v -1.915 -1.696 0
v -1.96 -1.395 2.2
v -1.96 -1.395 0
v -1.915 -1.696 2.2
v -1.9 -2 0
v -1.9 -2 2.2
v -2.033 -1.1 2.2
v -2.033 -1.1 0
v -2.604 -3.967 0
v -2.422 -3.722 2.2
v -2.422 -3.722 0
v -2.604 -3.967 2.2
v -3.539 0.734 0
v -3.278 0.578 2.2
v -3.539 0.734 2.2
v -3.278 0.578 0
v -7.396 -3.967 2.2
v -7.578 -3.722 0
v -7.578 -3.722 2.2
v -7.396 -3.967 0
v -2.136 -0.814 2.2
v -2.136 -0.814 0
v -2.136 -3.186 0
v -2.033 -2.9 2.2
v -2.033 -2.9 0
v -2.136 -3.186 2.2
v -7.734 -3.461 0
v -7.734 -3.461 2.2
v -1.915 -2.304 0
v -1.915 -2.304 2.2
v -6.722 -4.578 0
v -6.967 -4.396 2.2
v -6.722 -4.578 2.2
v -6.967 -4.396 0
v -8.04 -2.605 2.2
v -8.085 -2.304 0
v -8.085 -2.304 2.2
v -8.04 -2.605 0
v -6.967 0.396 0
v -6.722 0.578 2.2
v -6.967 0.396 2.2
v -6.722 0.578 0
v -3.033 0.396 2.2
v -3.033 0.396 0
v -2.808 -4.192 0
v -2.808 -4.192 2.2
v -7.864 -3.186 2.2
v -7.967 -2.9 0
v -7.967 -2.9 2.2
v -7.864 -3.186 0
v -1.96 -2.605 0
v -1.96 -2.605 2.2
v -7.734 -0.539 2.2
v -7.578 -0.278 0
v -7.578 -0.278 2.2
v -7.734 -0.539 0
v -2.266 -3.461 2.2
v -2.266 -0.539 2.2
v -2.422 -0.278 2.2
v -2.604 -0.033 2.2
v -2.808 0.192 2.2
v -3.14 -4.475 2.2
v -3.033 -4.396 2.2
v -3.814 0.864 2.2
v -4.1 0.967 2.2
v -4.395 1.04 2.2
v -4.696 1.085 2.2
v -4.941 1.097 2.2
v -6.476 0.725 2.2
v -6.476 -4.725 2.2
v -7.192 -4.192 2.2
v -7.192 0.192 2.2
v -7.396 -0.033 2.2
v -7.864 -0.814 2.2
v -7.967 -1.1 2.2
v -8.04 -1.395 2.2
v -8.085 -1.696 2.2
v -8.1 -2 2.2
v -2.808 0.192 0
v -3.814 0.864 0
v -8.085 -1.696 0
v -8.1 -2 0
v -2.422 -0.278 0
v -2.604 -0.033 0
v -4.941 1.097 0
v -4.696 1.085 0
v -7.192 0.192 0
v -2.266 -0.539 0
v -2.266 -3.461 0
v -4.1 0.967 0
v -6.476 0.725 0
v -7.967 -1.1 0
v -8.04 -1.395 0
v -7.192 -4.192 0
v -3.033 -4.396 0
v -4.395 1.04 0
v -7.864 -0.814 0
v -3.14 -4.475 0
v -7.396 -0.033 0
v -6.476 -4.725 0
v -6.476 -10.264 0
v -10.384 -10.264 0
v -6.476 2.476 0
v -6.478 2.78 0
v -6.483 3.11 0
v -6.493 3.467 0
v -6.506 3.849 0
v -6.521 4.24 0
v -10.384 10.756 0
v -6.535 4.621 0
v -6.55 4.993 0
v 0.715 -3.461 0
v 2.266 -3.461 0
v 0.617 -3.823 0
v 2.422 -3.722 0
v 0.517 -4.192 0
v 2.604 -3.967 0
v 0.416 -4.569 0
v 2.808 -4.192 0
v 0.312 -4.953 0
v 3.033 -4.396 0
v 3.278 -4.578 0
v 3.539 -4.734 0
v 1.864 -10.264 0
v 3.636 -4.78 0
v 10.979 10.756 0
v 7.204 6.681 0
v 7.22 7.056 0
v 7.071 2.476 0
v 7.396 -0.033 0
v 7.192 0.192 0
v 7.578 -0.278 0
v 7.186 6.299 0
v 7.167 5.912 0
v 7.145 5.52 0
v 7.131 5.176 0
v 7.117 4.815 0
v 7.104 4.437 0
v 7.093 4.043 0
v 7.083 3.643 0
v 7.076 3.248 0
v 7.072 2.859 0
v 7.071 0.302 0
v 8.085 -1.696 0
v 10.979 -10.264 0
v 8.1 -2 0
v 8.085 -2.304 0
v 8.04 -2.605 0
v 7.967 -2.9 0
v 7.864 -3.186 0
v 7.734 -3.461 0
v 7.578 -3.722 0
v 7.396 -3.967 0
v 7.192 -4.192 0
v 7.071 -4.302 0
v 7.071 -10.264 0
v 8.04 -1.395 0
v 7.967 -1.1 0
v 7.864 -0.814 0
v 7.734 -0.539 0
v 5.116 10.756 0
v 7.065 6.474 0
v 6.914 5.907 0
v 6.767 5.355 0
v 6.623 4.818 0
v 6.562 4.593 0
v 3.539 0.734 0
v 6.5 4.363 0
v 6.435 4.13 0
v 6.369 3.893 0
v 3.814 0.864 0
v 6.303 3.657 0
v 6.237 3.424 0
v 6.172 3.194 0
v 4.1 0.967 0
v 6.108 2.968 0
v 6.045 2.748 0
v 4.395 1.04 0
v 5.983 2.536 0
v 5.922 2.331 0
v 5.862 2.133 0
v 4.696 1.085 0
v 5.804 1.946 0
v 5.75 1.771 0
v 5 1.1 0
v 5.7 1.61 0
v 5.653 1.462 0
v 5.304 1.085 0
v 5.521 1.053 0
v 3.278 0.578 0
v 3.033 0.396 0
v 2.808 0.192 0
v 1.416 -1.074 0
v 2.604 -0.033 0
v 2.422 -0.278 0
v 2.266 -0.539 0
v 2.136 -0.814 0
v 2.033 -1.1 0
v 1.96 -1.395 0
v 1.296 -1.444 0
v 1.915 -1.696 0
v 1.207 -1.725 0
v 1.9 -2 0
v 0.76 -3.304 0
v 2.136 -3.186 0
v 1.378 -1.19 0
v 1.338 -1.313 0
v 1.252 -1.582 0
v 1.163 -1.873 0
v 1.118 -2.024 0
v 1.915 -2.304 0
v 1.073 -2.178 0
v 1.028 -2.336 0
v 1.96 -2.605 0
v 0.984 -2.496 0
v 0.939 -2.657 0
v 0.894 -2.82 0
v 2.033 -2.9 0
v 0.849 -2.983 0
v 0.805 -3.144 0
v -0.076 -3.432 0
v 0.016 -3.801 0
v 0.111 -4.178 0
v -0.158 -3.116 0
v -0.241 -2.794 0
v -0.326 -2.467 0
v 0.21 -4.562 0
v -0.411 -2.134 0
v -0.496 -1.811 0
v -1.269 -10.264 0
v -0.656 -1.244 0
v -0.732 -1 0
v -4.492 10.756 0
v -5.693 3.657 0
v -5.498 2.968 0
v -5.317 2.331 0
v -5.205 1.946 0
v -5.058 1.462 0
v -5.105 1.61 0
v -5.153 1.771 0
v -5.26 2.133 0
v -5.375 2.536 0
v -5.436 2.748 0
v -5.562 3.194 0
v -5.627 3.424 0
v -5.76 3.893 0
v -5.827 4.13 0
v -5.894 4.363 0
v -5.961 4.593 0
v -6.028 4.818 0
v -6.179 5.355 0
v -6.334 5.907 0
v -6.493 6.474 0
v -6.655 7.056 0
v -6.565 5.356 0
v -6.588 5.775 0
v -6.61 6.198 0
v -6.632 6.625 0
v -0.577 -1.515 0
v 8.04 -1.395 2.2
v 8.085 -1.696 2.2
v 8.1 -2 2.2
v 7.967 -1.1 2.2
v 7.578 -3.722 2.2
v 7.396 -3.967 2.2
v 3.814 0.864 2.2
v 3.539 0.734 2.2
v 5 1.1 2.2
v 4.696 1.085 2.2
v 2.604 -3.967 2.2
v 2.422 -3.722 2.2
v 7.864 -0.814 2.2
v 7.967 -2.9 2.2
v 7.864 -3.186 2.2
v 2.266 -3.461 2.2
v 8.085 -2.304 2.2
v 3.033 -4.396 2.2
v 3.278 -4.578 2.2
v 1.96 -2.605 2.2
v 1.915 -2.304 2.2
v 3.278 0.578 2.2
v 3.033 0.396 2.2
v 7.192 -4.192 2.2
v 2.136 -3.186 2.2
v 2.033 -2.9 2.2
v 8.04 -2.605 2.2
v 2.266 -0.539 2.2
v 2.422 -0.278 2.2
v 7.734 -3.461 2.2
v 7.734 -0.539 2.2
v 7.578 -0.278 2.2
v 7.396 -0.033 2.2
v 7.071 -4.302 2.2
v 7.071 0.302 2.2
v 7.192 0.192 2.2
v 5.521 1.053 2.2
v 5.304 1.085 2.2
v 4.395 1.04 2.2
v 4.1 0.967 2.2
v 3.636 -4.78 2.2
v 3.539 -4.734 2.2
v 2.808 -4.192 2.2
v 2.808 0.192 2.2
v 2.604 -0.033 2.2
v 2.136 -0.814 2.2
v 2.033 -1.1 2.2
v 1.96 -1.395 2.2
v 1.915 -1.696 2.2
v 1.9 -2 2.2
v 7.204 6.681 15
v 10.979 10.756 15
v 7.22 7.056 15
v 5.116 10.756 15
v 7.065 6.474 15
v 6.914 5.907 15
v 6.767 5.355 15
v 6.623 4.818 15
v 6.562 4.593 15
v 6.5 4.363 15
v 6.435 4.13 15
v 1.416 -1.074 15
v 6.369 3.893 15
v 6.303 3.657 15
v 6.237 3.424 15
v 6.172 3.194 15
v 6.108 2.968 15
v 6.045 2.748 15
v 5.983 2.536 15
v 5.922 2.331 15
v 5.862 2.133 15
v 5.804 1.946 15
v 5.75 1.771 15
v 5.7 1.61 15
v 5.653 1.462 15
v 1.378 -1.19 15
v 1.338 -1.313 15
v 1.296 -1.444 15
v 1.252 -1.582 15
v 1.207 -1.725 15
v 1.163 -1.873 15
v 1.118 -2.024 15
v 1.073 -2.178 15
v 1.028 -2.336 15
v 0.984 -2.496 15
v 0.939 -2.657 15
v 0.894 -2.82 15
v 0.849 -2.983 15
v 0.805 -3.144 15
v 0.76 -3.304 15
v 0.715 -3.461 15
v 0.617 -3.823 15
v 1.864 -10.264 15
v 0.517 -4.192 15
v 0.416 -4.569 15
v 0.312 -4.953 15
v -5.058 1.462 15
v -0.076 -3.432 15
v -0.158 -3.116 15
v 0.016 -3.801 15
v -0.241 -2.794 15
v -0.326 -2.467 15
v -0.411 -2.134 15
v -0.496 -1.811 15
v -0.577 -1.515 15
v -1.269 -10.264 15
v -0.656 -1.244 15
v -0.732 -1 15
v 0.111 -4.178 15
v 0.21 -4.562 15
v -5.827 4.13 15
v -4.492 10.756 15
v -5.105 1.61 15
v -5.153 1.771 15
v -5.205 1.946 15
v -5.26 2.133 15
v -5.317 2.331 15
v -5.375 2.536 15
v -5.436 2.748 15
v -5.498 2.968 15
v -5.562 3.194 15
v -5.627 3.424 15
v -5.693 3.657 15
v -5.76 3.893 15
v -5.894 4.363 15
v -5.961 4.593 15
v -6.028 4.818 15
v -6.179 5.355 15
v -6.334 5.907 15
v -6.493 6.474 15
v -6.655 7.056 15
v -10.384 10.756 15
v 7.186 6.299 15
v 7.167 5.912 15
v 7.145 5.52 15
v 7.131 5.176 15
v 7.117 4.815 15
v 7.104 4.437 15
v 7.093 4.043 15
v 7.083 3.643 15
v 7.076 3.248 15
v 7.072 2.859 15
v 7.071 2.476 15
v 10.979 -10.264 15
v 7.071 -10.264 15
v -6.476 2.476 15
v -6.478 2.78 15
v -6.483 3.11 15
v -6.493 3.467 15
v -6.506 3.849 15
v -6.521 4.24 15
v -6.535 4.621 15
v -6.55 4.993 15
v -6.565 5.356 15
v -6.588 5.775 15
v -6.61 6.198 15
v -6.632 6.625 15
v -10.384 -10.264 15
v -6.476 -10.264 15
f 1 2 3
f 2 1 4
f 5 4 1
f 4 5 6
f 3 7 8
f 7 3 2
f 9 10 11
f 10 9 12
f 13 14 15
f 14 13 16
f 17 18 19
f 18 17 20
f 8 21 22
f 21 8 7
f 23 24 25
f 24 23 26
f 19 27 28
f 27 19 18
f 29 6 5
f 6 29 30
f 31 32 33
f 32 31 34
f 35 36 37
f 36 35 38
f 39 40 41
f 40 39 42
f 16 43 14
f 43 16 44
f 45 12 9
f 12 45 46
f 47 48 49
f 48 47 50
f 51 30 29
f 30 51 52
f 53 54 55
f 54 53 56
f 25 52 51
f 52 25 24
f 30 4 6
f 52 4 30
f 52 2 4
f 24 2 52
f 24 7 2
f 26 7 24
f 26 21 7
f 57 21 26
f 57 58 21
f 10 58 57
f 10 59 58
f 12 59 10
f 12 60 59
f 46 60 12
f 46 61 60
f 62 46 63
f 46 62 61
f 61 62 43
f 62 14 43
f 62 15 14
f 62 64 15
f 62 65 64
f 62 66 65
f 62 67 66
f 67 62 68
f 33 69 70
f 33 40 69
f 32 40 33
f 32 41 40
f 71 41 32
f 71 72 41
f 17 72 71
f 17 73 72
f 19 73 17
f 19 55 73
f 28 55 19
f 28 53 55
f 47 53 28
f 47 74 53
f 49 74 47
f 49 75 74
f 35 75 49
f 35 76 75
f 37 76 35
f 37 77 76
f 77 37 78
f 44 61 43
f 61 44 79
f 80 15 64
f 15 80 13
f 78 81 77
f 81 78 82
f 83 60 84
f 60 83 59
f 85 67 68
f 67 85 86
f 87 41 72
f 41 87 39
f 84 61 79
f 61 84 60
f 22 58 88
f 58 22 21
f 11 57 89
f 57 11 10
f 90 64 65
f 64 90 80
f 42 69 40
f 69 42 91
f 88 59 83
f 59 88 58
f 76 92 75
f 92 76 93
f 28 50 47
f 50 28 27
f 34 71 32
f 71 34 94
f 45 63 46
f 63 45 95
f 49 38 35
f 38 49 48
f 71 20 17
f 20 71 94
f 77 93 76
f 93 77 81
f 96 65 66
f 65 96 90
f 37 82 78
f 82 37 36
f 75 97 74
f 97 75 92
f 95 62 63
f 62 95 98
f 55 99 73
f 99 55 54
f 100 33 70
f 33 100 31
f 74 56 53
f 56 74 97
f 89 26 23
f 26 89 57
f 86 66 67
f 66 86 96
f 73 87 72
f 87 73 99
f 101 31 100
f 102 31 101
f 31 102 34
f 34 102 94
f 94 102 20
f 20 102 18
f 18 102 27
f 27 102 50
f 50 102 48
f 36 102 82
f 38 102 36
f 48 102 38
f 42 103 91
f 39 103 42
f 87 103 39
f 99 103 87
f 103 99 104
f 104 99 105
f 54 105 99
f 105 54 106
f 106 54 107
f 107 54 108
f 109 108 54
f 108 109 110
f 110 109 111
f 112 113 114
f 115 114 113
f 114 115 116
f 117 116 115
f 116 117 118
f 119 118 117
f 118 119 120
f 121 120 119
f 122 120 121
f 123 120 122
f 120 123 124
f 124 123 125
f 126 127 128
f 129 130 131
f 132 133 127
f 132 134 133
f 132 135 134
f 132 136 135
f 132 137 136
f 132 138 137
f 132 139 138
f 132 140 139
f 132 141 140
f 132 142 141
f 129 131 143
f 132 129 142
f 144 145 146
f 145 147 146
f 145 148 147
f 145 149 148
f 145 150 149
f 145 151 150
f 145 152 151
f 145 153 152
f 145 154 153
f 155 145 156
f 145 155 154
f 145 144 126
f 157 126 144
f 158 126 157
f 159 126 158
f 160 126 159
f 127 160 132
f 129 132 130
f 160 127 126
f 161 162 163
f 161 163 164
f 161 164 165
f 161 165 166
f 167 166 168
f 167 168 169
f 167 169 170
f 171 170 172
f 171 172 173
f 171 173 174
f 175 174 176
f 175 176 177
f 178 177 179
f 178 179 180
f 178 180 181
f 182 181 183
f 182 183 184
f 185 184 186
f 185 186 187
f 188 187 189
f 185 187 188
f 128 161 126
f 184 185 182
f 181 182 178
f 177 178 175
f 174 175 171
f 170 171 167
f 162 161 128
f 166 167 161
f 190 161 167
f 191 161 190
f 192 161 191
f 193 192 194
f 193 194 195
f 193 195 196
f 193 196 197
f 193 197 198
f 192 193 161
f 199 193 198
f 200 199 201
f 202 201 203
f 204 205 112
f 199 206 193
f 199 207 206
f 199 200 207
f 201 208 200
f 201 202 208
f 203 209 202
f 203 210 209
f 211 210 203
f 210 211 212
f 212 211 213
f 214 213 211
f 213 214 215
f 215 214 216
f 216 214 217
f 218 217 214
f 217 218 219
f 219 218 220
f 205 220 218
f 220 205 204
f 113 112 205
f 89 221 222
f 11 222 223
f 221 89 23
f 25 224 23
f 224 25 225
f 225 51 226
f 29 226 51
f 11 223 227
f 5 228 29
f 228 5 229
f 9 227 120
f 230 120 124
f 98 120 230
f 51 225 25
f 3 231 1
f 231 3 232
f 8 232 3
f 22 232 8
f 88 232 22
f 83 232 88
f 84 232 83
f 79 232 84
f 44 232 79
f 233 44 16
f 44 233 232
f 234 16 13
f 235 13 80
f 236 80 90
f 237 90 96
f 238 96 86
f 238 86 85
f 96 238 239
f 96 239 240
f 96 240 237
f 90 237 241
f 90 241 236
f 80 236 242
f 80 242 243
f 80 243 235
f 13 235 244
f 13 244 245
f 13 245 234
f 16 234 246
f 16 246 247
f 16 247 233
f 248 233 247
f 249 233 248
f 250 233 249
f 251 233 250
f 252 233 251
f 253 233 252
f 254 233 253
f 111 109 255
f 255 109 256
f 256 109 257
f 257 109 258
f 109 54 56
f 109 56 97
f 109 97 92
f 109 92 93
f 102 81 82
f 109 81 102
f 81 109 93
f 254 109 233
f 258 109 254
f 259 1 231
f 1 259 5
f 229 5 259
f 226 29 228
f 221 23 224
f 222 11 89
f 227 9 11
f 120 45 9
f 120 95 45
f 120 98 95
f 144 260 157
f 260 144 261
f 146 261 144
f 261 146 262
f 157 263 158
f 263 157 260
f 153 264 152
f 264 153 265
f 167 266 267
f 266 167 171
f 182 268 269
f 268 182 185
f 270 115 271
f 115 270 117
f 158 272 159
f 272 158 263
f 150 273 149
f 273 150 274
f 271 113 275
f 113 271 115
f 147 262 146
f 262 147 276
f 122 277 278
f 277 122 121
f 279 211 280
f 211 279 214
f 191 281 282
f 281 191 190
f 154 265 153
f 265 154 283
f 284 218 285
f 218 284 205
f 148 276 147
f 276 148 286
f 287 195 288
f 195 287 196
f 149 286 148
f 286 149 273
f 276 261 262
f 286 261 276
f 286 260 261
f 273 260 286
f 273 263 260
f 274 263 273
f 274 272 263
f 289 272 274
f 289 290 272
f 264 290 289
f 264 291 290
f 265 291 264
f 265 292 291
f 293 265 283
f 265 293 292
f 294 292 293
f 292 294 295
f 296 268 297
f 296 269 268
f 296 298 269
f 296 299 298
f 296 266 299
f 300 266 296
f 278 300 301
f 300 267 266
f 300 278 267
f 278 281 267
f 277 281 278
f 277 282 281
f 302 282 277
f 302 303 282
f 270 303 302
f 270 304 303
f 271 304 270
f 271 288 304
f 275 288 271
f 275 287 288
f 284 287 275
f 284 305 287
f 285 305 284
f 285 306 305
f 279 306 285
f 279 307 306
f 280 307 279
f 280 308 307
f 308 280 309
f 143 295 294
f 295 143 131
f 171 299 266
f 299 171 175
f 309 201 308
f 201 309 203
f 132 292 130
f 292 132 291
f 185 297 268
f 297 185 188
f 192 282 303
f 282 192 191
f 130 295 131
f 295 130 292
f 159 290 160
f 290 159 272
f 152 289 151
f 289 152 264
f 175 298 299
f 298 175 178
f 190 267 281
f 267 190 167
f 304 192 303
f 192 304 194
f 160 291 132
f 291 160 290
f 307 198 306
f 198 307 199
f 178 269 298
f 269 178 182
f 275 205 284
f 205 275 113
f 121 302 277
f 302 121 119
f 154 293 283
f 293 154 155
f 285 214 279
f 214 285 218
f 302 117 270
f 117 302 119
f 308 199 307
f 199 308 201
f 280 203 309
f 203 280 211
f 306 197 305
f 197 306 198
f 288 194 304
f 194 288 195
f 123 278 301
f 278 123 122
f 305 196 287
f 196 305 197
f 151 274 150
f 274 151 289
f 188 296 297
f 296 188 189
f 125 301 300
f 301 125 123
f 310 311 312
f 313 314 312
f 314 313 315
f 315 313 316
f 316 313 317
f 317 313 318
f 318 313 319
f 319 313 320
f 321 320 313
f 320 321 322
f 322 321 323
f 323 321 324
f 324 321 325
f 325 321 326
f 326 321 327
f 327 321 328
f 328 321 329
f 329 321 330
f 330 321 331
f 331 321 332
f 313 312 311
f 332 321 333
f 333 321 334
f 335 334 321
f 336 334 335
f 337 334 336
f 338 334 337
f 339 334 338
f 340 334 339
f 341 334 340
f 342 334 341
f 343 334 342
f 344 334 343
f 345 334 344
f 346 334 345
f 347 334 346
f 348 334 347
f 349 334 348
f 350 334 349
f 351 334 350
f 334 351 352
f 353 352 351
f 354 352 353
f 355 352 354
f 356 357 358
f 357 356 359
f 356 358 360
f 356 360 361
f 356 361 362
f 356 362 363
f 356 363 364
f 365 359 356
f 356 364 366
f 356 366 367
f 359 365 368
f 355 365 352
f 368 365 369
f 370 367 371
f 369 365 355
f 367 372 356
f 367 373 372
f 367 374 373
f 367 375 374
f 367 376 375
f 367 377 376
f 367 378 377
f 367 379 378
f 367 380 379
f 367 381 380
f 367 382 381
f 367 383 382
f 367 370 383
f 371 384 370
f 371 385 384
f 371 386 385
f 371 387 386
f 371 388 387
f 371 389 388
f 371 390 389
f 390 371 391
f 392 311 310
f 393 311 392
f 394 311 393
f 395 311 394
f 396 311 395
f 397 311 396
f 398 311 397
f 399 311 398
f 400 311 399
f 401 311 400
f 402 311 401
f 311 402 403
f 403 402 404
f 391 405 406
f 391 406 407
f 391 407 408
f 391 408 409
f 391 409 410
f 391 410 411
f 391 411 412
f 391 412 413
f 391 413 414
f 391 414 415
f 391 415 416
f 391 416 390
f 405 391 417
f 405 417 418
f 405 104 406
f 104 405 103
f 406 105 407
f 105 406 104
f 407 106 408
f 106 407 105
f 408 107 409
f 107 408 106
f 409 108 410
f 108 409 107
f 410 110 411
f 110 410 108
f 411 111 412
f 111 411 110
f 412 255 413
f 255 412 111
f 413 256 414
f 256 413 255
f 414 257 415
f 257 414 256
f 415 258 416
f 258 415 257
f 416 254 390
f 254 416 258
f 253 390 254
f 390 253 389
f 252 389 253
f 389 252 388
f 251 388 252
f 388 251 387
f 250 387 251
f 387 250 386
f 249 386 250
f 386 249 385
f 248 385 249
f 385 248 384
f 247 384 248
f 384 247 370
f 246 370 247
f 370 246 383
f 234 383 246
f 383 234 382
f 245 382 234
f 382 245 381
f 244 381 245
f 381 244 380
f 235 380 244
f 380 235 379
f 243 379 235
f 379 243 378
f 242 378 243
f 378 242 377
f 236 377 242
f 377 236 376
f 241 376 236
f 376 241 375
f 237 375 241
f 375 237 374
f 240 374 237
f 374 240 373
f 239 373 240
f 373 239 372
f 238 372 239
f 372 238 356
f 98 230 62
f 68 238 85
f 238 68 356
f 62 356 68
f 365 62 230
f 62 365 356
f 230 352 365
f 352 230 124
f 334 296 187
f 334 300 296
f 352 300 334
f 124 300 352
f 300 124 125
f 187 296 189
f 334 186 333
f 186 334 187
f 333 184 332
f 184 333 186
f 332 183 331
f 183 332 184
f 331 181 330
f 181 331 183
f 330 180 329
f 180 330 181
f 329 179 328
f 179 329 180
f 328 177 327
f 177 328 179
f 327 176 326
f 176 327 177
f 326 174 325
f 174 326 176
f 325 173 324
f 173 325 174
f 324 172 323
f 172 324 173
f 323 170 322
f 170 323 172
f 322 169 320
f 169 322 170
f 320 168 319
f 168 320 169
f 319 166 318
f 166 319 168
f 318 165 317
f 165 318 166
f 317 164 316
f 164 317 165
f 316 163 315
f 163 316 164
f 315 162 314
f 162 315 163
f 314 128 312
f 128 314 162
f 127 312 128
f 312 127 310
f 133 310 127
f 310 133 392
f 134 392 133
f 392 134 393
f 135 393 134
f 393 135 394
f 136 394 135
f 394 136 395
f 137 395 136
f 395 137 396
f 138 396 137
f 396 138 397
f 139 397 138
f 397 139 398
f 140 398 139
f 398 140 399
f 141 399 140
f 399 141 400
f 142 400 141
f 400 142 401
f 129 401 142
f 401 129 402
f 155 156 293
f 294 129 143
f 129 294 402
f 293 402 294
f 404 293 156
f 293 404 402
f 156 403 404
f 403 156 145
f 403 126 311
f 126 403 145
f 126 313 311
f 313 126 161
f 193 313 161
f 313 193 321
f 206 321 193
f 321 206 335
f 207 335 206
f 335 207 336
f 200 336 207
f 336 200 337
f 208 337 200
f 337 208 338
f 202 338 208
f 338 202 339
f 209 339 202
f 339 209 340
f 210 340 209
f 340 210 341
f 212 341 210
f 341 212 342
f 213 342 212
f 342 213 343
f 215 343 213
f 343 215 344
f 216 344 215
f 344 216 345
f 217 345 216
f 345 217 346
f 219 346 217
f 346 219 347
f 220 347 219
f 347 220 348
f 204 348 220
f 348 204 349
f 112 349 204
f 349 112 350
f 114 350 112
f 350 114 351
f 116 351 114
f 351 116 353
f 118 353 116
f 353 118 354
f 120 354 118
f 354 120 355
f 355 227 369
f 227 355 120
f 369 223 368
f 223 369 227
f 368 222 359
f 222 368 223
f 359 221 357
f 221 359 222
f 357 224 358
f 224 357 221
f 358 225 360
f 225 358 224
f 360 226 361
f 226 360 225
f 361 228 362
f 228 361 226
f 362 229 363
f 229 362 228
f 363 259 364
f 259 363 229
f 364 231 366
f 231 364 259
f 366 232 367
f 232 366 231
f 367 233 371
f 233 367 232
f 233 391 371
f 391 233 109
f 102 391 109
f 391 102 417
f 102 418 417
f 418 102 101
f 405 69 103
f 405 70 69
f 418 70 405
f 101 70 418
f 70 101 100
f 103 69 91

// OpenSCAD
// Letter-only magnetic tile (no backing block)
// Example:
// openscad -q -D 'letter="M"' -o M.stl magnetic_letter_only.scad

letter = "M";
font_name = "Liberation Sans:style=Bold";
size = 22;           // overall glyph size
thickness = 15;      // Z height target

// Magnet pockets on backside (z=0 face)
magnet_d = 6.2;
magnet_depth = 2.2;

// Each entry is [x, y] — add, remove, or drag these to taste.
// Origin [0,0] is the visual center of the glyph.
magnet_positions = [
  [-5, -2],
  [ 5, -2],
];

module letter_body(ch) {
  linear_extrude(height = thickness)
    text(ch, size = size, font = font_name, halign = "center", valign = "center");
}

module pockets() {
  for (pos = magnet_positions)
    translate([pos[0], pos[1], 0])
      cylinder(h = magnet_depth, d = magnet_d, $fn = 64);
}

difference() {
  letter_body(letter);
  pockets();
}
